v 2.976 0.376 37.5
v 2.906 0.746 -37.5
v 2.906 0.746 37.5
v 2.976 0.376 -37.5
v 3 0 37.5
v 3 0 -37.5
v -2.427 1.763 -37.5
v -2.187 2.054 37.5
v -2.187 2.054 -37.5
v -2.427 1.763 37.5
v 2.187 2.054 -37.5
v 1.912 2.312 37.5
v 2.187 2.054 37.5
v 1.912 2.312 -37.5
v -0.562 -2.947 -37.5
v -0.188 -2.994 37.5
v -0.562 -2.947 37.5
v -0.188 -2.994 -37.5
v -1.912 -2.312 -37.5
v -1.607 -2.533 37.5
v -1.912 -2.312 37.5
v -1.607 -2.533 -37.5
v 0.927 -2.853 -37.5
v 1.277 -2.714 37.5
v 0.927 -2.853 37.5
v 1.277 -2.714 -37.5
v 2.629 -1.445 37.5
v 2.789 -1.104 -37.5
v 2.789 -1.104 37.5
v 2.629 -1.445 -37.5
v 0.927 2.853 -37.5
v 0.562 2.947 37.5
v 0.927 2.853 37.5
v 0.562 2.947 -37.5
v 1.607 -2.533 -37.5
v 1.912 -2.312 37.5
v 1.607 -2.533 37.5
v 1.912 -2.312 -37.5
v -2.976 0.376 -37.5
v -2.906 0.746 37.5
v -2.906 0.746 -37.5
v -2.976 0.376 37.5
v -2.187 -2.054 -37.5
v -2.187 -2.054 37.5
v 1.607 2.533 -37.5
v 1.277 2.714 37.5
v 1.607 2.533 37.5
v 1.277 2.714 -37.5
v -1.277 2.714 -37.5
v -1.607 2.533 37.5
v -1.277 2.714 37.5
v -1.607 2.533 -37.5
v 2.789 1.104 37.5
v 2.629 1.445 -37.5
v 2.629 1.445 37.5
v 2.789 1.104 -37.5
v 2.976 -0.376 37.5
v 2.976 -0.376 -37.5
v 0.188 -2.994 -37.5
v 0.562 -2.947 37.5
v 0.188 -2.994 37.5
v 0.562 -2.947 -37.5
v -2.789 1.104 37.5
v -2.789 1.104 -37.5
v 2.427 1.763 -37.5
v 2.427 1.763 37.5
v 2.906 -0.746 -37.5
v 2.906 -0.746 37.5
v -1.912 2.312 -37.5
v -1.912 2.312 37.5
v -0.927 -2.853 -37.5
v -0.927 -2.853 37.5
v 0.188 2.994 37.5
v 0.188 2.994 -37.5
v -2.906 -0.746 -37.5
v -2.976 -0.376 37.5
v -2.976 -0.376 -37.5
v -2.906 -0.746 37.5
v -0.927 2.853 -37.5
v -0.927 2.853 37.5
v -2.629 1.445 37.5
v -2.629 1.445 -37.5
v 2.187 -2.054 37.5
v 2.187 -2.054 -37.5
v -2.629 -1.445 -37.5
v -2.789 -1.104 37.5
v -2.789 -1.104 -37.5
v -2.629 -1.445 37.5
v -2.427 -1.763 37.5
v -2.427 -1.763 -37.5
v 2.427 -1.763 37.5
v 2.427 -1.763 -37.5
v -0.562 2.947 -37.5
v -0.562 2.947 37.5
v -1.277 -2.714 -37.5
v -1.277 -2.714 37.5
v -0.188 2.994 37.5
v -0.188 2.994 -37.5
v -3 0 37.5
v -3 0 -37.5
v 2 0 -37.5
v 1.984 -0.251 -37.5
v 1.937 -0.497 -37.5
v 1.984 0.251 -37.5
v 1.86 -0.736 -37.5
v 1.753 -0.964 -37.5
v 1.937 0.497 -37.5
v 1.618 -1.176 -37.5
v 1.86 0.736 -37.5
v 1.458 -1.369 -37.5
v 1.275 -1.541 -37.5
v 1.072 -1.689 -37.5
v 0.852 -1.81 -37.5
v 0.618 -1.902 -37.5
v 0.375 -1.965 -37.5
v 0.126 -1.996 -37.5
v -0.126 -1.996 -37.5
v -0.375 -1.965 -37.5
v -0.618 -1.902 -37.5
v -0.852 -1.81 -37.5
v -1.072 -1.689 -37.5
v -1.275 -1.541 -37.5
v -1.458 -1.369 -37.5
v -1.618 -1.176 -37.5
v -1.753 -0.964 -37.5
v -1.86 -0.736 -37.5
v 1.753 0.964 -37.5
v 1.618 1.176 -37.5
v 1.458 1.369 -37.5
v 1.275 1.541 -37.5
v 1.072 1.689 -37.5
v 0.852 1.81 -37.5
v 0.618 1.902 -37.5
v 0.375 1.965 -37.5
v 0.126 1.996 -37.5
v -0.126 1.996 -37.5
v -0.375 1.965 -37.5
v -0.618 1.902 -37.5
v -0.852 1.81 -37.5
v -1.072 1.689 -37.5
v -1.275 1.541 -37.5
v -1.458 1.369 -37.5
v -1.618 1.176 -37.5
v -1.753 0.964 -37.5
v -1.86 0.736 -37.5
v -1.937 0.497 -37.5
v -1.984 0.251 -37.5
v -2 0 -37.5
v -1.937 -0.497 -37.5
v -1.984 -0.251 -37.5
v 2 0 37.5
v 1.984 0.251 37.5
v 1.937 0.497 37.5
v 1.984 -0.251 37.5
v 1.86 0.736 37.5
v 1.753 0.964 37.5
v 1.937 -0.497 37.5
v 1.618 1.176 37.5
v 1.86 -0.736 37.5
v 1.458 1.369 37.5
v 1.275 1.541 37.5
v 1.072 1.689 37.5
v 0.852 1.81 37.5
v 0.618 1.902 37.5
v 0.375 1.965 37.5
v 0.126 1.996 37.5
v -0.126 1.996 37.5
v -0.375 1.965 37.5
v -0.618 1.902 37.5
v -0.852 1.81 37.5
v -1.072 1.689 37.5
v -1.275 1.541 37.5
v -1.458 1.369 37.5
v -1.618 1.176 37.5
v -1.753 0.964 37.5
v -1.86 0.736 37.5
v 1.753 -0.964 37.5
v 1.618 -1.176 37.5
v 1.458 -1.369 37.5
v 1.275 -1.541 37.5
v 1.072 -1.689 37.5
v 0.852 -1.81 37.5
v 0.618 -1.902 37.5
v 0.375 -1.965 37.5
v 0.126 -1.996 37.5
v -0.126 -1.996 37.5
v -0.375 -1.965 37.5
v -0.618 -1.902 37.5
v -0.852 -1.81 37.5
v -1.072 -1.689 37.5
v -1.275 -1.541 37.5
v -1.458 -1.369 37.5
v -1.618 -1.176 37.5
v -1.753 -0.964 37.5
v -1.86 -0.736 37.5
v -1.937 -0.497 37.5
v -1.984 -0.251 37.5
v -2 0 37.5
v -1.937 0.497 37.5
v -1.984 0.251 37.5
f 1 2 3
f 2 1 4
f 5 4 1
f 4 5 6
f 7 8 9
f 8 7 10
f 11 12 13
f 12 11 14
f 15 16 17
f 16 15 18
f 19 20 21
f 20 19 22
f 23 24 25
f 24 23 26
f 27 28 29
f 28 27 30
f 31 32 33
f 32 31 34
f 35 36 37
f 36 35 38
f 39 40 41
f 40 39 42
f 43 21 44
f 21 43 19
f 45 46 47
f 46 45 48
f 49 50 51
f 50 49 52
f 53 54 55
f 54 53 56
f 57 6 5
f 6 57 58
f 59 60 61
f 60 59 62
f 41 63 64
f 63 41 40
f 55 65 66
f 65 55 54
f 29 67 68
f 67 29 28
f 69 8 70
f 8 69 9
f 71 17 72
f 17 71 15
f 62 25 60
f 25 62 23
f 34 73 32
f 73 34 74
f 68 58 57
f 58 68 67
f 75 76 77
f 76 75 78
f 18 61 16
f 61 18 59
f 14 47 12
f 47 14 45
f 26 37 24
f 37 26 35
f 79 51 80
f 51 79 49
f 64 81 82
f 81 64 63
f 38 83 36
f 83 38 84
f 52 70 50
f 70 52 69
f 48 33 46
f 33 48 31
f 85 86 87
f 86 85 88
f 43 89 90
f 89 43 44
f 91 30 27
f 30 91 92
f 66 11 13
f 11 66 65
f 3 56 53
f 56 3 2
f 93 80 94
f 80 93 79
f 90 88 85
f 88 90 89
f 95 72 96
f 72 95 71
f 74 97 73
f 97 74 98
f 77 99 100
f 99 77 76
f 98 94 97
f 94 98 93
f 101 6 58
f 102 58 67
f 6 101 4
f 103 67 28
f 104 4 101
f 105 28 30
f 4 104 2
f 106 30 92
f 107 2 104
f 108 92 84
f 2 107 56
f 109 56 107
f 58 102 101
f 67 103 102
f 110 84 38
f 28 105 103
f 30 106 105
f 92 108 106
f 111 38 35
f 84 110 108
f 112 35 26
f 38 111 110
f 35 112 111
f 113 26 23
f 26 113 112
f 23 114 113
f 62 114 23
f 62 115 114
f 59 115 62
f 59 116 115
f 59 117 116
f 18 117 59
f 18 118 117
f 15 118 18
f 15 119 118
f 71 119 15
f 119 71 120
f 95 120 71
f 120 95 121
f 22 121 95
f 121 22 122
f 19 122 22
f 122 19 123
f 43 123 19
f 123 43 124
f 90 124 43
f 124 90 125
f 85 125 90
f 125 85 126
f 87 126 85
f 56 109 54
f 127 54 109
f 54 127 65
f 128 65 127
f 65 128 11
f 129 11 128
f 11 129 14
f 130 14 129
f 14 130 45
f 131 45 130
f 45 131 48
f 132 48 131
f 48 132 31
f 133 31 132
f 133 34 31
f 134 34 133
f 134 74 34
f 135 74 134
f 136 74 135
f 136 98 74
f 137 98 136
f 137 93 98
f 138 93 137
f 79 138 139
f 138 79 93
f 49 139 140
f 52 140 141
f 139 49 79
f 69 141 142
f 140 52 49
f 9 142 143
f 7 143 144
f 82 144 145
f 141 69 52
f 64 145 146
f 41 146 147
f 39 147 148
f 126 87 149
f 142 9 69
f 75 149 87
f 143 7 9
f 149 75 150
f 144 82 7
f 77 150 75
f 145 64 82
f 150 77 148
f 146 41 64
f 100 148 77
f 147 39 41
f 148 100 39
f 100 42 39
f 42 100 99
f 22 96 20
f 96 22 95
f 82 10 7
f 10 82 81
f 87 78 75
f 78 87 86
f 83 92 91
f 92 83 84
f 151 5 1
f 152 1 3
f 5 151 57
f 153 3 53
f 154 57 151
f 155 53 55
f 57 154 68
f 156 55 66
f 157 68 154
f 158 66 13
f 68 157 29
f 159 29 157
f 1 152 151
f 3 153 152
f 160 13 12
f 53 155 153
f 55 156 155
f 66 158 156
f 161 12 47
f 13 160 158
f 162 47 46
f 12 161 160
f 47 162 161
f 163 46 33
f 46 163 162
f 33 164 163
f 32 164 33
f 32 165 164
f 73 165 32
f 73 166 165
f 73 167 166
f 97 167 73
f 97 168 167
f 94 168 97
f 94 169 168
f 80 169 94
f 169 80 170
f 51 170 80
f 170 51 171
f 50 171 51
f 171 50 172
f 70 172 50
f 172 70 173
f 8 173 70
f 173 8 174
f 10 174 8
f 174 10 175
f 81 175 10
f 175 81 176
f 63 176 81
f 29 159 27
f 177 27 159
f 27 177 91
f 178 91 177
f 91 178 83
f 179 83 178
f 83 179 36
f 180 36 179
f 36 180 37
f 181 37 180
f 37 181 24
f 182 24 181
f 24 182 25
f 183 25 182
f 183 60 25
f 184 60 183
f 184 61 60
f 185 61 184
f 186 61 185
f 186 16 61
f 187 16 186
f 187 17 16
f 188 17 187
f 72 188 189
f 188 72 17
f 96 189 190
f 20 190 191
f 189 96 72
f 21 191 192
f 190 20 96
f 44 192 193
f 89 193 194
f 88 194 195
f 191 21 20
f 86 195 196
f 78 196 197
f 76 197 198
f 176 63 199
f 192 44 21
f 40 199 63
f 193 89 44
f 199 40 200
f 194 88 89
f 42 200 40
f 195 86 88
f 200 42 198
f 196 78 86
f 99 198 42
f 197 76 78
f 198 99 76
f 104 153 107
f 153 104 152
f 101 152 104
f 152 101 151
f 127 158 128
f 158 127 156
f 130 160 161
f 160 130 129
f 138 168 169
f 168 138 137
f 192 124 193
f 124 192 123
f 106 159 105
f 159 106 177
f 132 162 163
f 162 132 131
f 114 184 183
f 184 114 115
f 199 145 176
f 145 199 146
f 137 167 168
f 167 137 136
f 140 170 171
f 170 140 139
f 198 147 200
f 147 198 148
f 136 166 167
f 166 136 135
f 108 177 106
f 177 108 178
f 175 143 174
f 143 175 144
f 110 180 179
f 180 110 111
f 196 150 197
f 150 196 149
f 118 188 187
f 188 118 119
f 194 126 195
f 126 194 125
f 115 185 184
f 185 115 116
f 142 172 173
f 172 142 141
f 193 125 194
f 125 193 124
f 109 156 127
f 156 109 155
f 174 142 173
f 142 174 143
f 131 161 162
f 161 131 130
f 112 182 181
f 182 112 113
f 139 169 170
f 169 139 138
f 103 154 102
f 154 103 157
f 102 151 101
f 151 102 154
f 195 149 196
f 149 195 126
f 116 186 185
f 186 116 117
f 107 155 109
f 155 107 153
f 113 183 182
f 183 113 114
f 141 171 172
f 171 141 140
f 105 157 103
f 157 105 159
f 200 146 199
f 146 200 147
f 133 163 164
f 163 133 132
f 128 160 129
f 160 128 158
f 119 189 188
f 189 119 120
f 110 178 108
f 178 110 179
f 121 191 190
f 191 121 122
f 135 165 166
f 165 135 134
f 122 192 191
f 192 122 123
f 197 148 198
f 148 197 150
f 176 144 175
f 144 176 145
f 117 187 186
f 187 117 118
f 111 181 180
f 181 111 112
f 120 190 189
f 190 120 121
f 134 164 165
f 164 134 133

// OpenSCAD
$fn = 50;


difference() {
	union() {
		translate(v = [0, 0, -37.5000000000]) {
			cylinder(h = 75, r = 3.0000000000);
		}
	}
	union() {
		translate(v = [0, 0, -100.0000000000]) {
			cylinder(h = 200, r = 2.0000000000);
		}
	}
}
